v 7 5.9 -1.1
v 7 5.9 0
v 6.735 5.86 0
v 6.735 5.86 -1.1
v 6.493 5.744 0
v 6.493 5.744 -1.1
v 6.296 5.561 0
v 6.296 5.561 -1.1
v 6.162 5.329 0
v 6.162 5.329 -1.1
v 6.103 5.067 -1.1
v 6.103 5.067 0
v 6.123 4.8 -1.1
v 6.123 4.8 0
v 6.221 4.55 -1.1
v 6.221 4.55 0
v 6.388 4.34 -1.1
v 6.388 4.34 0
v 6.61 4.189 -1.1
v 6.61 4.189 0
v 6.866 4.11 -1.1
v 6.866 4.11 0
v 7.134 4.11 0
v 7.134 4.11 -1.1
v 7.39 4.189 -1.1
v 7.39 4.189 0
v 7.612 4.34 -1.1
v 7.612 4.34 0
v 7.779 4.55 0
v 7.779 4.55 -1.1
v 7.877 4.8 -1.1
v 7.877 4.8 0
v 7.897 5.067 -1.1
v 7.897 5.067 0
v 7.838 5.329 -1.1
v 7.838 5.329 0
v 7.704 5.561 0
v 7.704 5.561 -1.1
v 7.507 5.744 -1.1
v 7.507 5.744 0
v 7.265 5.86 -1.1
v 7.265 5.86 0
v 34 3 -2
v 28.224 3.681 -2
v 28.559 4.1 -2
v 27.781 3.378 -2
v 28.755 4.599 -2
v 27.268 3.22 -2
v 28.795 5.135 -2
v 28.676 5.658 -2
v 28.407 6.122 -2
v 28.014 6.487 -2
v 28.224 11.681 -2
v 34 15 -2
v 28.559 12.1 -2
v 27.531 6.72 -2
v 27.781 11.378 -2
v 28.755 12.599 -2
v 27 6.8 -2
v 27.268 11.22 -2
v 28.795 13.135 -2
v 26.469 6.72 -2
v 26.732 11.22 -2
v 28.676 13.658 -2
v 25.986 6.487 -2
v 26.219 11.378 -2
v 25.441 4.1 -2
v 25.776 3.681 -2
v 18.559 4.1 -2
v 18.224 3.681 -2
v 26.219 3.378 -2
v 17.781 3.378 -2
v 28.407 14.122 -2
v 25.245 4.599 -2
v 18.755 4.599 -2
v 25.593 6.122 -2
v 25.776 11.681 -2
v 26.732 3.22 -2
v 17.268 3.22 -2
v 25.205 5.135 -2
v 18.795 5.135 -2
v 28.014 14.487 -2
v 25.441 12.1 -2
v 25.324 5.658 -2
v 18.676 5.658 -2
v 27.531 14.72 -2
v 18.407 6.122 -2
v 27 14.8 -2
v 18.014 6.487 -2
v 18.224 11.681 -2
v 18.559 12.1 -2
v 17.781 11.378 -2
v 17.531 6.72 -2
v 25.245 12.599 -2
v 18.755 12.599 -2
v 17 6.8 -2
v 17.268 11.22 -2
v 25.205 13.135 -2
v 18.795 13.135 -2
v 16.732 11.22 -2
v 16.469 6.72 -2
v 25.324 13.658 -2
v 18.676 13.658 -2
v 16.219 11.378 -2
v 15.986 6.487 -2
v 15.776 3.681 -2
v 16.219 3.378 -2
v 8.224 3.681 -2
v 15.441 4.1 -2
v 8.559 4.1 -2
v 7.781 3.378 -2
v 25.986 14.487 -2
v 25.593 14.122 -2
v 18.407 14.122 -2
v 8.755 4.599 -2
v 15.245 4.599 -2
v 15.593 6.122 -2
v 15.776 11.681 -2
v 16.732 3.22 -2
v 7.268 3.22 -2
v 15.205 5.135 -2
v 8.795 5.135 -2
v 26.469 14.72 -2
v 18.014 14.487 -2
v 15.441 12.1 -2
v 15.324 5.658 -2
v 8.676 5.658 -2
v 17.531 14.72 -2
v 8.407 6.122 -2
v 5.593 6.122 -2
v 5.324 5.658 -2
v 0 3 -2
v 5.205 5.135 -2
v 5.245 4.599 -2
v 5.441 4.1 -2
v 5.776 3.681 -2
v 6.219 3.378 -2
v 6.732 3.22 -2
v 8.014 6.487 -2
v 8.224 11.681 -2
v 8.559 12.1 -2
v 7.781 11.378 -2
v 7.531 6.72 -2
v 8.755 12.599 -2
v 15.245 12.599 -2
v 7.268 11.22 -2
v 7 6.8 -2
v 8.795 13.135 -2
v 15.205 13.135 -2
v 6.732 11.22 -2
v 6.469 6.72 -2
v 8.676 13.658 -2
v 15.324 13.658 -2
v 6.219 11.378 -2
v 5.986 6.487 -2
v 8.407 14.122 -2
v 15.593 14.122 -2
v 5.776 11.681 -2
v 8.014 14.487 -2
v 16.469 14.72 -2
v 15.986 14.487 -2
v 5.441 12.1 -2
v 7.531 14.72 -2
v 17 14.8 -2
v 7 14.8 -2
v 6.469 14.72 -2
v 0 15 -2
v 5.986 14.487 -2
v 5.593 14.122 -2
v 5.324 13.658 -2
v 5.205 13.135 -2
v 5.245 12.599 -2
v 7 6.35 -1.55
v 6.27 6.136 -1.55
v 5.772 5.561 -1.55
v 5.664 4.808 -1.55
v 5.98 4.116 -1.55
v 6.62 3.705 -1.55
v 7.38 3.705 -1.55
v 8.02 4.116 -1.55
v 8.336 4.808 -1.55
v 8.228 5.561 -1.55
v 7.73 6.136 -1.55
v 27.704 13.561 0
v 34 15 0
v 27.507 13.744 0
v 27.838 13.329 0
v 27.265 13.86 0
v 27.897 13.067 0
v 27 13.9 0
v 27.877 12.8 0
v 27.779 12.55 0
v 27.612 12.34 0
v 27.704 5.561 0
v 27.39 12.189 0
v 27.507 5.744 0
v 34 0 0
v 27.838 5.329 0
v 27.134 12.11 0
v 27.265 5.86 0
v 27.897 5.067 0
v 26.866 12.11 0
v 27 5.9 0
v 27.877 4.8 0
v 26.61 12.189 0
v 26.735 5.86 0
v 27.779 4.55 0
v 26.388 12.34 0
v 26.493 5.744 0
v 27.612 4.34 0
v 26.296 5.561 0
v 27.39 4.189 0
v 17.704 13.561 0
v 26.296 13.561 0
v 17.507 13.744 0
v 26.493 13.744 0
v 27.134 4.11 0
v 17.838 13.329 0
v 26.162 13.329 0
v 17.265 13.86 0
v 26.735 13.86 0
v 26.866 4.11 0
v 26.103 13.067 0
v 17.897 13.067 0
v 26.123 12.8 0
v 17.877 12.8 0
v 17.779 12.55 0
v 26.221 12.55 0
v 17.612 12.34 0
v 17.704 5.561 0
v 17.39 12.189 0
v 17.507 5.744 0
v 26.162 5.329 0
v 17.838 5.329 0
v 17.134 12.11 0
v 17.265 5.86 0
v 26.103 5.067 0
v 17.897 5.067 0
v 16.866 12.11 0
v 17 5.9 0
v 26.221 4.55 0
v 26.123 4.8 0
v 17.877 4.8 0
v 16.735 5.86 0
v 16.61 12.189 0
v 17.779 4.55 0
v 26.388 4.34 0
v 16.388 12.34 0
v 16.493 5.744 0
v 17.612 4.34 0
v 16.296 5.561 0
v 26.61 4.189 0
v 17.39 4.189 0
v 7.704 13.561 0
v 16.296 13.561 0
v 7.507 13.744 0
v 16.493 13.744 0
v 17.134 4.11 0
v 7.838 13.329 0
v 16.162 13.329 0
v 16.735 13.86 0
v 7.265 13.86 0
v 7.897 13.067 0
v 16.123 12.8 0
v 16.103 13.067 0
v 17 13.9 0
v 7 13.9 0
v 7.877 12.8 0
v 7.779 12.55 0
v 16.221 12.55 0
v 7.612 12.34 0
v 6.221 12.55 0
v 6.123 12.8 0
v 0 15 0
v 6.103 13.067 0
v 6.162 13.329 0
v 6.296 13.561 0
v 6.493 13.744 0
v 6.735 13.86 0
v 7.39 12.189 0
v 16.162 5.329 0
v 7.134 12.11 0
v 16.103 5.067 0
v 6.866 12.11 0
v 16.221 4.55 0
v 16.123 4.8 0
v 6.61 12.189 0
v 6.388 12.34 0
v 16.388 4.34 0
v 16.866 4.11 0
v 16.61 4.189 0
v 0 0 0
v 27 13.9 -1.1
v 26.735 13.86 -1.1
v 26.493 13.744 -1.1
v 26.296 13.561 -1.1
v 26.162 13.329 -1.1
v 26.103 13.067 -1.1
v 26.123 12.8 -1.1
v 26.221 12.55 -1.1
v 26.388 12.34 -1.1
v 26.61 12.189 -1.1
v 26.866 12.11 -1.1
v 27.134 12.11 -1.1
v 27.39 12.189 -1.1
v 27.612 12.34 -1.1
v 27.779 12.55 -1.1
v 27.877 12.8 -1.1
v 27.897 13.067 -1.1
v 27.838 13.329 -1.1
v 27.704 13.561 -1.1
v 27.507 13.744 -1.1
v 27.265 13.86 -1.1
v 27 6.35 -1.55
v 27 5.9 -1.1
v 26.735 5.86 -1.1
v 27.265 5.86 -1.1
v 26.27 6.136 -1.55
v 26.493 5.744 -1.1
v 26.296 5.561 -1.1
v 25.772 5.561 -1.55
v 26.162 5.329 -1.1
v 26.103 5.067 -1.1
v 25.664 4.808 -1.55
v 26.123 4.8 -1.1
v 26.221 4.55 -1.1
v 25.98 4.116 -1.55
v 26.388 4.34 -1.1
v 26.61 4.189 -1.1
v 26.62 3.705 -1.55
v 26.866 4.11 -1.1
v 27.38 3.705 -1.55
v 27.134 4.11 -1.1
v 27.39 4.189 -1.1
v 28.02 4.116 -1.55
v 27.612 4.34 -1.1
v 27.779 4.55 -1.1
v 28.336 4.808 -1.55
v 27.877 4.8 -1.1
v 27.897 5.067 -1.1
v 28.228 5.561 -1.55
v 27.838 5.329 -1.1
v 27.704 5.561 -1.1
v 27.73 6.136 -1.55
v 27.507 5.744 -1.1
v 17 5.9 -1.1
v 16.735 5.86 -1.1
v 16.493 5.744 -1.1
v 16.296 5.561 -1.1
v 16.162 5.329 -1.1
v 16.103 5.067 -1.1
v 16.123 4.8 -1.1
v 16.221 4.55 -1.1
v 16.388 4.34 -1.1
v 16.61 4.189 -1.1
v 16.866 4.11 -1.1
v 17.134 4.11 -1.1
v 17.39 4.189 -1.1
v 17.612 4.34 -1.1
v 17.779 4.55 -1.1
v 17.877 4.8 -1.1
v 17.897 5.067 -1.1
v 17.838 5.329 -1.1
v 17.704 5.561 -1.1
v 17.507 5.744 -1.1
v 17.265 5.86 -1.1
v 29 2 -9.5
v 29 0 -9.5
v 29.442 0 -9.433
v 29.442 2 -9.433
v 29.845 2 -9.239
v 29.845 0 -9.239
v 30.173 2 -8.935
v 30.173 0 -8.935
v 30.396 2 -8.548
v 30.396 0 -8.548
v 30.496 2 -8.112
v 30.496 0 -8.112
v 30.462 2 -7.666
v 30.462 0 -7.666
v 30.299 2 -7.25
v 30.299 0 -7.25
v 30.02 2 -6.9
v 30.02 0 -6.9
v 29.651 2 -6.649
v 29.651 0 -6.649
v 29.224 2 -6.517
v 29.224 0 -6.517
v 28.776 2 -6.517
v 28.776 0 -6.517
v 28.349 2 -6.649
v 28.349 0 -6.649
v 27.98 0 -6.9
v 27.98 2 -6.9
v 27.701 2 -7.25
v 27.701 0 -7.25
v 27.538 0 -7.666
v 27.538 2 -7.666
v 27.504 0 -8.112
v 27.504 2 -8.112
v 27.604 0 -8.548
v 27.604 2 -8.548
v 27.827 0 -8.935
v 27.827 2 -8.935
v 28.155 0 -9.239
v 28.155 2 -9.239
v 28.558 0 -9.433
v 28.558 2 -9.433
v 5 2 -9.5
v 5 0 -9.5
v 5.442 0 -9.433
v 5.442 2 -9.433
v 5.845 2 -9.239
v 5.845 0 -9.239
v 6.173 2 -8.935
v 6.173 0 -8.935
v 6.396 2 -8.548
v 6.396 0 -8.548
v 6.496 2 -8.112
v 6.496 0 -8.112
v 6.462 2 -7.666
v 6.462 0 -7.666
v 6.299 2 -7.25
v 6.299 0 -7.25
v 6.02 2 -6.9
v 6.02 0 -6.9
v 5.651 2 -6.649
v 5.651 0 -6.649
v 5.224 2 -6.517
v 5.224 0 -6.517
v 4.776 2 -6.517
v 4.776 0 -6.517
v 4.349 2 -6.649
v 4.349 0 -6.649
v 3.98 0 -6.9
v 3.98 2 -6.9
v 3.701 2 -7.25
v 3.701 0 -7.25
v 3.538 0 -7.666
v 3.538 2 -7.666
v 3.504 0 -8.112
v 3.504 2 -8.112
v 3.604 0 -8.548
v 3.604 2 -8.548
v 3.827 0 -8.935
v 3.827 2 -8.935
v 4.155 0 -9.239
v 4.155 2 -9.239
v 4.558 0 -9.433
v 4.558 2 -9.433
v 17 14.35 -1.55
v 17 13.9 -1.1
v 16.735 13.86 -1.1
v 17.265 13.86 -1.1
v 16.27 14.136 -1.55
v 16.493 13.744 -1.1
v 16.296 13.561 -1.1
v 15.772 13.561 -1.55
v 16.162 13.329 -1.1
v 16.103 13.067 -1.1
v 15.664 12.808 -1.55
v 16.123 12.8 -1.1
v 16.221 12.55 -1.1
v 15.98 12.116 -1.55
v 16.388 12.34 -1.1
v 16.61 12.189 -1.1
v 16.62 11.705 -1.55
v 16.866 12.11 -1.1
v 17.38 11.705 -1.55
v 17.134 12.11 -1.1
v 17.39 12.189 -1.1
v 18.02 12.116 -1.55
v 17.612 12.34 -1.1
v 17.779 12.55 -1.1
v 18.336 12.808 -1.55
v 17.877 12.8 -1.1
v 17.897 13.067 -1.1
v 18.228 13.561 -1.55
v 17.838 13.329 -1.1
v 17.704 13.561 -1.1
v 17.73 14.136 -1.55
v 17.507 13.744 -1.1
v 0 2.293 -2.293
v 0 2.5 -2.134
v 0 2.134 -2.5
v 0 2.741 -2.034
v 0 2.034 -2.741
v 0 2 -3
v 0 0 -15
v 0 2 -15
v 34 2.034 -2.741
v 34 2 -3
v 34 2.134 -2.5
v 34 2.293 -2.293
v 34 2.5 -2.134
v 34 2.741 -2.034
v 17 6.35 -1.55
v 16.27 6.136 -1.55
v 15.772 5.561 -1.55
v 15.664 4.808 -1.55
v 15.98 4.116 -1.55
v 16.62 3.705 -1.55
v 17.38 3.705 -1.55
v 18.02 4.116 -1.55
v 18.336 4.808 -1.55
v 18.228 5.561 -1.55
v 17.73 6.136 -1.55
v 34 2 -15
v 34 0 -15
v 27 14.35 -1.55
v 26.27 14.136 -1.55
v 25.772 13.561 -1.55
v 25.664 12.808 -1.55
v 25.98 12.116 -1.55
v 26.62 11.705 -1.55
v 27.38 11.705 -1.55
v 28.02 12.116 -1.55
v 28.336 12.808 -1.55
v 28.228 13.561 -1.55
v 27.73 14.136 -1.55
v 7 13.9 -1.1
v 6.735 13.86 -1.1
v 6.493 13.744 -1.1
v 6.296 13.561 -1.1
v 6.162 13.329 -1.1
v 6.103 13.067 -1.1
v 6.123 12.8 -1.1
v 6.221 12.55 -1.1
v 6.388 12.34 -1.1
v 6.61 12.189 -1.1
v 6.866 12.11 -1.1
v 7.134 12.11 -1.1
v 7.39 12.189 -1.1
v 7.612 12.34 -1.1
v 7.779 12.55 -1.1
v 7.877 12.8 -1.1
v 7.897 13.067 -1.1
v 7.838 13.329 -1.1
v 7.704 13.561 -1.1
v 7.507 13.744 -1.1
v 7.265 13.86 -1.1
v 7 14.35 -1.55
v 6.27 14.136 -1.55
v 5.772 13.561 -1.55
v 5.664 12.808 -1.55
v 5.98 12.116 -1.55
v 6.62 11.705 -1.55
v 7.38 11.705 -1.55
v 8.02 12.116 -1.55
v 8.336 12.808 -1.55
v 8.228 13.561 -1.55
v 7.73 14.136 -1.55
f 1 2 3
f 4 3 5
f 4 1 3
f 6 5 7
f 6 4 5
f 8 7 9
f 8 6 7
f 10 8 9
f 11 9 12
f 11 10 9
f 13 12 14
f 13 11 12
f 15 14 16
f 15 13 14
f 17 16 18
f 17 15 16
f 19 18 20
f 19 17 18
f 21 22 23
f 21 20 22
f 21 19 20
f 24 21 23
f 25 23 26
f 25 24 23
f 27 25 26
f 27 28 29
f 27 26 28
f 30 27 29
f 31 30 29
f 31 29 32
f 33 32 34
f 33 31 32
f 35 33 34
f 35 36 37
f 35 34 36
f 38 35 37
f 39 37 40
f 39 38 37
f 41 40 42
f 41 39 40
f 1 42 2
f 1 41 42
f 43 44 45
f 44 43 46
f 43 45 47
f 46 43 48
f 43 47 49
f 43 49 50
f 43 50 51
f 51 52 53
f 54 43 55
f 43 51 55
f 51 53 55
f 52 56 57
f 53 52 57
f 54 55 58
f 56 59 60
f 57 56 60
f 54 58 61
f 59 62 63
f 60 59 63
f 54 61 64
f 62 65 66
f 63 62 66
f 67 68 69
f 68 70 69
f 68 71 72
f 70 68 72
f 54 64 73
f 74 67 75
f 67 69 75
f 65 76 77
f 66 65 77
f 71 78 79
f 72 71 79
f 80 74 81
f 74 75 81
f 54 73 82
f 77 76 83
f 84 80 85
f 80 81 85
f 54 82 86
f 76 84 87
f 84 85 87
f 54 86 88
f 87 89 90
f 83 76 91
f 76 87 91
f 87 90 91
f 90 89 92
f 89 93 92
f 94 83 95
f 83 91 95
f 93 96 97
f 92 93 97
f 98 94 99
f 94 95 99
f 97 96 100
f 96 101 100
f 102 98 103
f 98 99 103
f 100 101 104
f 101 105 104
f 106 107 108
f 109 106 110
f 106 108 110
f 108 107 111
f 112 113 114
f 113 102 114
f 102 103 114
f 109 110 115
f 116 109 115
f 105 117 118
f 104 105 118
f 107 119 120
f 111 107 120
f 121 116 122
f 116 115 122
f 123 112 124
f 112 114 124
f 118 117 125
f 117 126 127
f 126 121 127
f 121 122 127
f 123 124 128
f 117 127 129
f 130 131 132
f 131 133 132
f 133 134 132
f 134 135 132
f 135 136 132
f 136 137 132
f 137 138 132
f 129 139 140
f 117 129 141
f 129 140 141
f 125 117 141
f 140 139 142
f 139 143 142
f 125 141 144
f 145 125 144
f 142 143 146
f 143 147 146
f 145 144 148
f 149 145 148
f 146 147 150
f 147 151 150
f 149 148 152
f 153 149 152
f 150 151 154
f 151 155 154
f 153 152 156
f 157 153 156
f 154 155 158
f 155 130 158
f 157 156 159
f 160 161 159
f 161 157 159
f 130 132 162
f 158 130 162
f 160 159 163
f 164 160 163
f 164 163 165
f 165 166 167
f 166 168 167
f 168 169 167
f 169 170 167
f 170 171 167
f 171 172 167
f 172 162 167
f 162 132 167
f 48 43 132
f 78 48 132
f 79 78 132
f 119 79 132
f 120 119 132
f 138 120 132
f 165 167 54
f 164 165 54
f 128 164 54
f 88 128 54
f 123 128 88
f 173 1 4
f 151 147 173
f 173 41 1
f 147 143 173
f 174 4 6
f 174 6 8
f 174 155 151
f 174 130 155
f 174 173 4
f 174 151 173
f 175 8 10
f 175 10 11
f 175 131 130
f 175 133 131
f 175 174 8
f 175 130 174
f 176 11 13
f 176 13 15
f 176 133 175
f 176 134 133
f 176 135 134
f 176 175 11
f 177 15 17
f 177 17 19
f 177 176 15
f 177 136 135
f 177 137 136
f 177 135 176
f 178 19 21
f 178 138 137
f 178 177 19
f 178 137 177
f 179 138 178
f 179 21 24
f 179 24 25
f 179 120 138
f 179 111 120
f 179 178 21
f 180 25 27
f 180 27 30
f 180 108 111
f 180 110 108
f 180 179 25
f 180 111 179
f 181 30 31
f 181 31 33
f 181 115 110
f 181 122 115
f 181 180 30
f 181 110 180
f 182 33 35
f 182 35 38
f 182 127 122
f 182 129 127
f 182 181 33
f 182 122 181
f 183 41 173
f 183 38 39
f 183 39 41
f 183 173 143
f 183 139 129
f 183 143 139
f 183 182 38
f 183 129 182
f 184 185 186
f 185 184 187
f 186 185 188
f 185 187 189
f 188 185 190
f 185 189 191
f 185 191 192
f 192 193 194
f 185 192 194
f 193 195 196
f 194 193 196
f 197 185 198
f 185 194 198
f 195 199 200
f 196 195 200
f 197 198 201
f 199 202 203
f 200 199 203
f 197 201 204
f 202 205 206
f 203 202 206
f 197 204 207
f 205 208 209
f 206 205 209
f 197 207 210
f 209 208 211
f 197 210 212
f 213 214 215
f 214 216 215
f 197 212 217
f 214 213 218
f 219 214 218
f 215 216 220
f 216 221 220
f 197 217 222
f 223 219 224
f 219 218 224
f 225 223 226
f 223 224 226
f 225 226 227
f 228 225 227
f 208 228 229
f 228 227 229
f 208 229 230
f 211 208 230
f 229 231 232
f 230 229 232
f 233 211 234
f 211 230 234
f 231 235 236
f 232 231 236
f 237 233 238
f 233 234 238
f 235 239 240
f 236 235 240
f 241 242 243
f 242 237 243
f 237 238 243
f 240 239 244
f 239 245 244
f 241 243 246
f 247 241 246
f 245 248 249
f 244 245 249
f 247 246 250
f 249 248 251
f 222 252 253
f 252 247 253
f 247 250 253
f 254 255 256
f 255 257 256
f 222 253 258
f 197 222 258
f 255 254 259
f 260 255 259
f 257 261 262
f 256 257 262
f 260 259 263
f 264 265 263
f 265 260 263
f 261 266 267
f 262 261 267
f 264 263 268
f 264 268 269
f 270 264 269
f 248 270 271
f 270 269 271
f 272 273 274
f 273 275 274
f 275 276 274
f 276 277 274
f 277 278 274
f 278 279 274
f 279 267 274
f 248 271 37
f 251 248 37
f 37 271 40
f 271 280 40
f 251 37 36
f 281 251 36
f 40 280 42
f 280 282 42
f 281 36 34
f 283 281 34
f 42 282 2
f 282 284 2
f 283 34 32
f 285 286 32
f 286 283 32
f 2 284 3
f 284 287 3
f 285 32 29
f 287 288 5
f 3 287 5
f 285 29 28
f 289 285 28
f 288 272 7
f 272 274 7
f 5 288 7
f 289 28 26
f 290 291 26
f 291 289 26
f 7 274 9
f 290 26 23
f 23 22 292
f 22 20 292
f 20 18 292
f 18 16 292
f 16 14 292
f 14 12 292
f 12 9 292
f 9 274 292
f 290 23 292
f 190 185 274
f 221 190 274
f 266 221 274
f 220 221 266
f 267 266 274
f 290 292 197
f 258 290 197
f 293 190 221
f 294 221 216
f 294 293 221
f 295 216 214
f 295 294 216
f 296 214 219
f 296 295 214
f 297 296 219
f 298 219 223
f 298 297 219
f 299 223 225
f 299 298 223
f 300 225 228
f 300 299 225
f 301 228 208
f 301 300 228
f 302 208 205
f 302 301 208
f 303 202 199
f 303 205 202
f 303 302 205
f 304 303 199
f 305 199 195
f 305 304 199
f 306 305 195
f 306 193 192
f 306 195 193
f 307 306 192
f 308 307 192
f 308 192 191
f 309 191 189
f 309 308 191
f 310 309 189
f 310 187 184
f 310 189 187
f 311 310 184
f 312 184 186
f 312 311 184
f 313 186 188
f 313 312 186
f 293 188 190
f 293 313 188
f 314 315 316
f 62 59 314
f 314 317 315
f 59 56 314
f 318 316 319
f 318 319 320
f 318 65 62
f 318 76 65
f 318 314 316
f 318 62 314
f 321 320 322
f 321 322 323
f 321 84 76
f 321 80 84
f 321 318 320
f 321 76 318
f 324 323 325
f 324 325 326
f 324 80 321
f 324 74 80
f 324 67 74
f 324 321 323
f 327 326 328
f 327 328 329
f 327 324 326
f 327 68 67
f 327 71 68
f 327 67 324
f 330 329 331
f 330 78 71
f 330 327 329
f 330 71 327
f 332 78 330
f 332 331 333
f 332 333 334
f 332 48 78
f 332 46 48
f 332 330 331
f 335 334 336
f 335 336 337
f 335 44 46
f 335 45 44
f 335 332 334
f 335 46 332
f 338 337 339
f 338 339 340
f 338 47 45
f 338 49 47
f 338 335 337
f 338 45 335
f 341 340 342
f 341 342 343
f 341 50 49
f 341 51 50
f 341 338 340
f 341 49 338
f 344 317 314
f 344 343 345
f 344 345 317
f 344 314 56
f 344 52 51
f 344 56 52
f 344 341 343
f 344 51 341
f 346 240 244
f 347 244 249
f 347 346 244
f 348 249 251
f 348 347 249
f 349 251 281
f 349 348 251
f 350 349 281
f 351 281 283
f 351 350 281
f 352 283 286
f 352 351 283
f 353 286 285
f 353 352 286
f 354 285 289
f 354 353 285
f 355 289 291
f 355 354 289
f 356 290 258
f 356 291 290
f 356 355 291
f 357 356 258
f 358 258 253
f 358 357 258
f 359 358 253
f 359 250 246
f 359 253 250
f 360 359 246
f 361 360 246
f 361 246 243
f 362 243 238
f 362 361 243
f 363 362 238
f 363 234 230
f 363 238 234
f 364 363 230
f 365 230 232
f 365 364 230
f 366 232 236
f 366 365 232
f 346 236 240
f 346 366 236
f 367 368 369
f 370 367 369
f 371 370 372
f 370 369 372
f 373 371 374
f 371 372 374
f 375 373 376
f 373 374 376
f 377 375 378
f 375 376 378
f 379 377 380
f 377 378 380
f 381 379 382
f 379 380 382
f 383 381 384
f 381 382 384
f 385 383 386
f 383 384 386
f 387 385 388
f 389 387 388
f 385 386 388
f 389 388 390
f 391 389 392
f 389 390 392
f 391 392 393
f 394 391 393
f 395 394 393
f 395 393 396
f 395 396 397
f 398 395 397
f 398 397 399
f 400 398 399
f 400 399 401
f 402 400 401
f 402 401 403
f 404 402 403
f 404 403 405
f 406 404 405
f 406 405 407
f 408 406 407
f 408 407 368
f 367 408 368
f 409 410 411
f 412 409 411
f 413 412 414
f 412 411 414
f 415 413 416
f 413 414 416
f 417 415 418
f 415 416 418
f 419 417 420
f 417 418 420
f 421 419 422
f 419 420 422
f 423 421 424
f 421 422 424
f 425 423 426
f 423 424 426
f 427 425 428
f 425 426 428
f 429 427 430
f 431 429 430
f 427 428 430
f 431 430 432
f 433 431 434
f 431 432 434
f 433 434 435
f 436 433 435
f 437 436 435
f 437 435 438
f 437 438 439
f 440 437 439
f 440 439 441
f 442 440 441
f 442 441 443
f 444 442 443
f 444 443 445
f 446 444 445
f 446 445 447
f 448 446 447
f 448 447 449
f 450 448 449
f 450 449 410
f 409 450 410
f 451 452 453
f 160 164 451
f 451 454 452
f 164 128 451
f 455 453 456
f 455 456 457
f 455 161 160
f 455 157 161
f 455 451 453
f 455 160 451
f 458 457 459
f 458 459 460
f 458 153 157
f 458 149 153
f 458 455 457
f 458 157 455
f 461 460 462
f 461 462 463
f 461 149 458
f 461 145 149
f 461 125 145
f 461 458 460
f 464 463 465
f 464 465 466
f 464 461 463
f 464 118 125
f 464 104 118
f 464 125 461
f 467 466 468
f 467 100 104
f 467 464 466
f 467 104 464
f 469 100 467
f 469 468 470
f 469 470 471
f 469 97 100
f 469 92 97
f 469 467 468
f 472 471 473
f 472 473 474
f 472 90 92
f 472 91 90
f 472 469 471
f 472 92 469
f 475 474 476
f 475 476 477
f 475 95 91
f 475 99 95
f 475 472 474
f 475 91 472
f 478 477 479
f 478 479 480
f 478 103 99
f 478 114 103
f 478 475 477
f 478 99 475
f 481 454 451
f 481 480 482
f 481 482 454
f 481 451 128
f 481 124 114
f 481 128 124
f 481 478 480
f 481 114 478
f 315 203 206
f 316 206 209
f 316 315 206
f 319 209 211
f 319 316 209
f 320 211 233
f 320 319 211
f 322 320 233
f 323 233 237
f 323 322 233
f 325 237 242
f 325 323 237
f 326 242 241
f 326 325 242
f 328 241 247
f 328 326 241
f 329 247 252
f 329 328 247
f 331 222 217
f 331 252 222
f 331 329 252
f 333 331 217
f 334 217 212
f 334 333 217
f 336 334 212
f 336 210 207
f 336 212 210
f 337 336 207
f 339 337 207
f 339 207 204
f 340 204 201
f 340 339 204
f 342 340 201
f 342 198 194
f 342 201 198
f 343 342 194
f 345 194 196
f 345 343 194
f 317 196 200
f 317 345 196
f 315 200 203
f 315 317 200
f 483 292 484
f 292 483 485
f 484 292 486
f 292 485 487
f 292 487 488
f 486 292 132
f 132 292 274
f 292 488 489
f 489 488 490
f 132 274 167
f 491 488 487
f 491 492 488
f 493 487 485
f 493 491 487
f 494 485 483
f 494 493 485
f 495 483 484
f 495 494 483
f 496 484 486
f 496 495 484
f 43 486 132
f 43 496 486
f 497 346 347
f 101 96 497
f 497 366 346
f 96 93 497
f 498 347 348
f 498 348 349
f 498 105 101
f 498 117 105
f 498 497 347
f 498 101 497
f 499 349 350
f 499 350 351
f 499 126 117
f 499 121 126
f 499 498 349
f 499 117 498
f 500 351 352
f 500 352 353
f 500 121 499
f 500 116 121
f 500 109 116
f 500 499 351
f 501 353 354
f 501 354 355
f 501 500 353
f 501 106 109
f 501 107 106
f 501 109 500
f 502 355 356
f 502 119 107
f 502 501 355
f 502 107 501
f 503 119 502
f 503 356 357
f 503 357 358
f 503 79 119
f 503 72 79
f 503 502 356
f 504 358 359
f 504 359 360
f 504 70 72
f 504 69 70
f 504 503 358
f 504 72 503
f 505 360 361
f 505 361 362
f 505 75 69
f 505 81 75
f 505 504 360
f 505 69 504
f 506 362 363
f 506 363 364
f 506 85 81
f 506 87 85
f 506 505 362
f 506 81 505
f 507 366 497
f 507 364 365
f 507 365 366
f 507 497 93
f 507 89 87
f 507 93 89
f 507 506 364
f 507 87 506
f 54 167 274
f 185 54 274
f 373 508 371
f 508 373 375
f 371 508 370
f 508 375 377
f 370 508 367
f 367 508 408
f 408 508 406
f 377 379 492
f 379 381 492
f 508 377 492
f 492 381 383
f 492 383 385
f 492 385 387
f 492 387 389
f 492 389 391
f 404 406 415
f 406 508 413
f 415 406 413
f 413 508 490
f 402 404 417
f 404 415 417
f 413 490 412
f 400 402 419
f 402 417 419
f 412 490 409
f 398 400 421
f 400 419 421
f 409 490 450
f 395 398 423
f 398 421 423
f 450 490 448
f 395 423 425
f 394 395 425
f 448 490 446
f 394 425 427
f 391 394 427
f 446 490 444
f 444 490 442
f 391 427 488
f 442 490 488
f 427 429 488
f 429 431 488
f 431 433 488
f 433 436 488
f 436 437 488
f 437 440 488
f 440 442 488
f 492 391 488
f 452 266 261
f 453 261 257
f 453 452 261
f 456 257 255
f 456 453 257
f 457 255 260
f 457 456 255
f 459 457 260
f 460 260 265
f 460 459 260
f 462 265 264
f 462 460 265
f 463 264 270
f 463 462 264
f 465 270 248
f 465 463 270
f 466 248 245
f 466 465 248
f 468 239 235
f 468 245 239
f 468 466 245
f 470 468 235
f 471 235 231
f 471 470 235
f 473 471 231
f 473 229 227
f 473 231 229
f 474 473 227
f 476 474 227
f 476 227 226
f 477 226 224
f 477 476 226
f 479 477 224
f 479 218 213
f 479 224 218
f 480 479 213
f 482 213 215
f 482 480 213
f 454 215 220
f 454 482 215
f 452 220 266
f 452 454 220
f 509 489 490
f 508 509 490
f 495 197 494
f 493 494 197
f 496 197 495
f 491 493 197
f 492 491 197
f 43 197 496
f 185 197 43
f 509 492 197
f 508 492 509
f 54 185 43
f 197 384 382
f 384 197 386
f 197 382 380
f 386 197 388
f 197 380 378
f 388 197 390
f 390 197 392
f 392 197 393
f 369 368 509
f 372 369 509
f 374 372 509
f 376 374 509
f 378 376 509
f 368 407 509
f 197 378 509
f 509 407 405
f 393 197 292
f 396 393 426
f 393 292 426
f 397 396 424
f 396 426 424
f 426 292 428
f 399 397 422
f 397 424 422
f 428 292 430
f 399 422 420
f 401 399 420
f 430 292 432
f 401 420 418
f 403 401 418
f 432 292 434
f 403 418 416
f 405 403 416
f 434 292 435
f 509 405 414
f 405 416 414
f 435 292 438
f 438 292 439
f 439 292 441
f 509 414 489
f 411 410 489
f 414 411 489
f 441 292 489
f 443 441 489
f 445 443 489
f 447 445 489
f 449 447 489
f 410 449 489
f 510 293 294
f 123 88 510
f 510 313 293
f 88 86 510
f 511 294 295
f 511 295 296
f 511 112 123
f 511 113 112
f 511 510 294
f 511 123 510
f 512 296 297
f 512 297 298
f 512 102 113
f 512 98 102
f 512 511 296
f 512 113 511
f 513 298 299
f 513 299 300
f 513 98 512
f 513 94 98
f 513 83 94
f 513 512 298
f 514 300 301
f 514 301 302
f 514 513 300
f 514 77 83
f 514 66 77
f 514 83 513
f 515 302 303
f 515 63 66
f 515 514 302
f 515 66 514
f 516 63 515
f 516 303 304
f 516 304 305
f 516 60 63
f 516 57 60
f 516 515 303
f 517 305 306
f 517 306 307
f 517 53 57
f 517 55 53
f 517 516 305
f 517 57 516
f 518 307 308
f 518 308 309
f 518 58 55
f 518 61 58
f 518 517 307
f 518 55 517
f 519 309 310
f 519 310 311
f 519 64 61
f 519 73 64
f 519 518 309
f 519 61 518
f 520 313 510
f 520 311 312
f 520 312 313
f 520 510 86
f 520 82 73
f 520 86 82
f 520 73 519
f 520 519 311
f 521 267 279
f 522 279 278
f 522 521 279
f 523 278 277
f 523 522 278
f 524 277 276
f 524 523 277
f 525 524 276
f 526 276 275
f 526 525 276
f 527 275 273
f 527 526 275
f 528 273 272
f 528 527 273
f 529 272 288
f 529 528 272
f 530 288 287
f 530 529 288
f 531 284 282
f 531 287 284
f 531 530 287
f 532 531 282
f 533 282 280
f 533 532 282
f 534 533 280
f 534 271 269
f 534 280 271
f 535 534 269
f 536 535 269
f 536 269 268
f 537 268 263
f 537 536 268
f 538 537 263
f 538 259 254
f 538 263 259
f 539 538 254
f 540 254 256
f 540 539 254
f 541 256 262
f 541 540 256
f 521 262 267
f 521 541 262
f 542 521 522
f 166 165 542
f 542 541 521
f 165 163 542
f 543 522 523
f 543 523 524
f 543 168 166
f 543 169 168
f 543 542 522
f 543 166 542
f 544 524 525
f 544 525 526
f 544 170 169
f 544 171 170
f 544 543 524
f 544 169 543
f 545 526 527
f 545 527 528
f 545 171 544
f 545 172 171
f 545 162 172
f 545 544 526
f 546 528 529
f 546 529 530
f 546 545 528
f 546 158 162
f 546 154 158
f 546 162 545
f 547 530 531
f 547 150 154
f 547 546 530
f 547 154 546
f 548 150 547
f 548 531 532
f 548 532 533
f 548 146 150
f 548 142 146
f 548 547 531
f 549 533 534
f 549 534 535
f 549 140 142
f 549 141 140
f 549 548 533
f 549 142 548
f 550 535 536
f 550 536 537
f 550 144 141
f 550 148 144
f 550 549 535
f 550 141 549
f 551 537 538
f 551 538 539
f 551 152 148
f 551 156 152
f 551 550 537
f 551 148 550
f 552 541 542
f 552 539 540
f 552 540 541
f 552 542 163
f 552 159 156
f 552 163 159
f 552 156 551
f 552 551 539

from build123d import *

# Parameters (mm, degrees)
BOSS_EXTRUDE1_DEPTH                          = 34
FILLET1_R                                    = 1
SKETCH2_R                                    = 1.5
CUT_EXTRUDE3_DEPTH                           = 10
CSK_FOR_M1_6_COUNTERSUNK_FLAT_HEAD_S_2_COUNT = 2
CSK_FOR_M1_6_COUNTERSUNK_FLAT_HEAD_S_2_PITCH = 8
LPATTERN1_COUNT                              = 2
LPATTERN1_PITCH                              = 10
LPATTERN2_COUNT                              = 2
LPATTERN2_PITCH                              = 10


with BuildPart() as part:
    # Sketch1 → Boss-Extrude1 (new body)
    with BuildSketch(Plane(origin=(0, 0, 0), x_dir=(0, 0, -1), z_dir=(1, 0, 0))):
        Polygon((0, 15), (0, 0), (15, 0), (15, 2), (2, 2), (2, 15), align=None)
    extrude(amount=BOSS_EXTRUDE1_DEPTH)

    # Fillet1
    fillet1_edges = [part.edges().sort_by_distance(p)[0] for p in [
        (17, 2, -2),
    ]]
    fillet(fillet1_edges, radius=FILLET1_R)

    # Sketch2 → Cut-Extrude3 (cut)
    with BuildSketch(Plane.XZ):
        with Locations(Location((28.999999992, -7.999999993, 0), (0, 0, 270))):
            Circle(SKETCH2_R)
        with Locations(Location((5, -8, 0), (0, 0, 270))):
            Circle(SKETCH2_R)
    extrude(amount=-CUT_EXTRUDE3_DEPTH, mode=Mode.SUBTRACT)

    # Sketch4 → CSK for M1.6 Countersunk Flat Head Screw1 (revolve, cut)
    with BuildSketch(Plane(origin=(17, 5, -2), x_dir=(0, 1, 0), z_dir=(1, 0, 0))):
        Polygon((0, 0), (0, 30.540774557), (0.9, 30), (0.9, 0.9), (1.8, 0), align=None)
    csk_for_m1_6_countersunk_flat_head_screw = revolve(axis=Axis((17, 5, -8.35), (0, 0, 1)), mode=Mode.SUBTRACT)

    # CSK for M1.6 Countersunk Flat Head S 2: CSK for M1.6 Countersunk Flat Head Screw1 ×2
    with Locations(*[(0, i * CSK_FOR_M1_6_COUNTERSUNK_FLAT_HEAD_S_2_PITCH, 0) for i in range(1, CSK_FOR_M1_6_COUNTERSUNK_FLAT_HEAD_S_2_COUNT)]):
        add(csk_for_m1_6_countersunk_flat_head_screw, mode=Mode.SUBTRACT)

    # LPattern1: CSK for M1.6 Countersunk Flat Head Screw1 ×2
    with Locations(*[(-i * LPATTERN1_PITCH, 0, 0) for i in range(1, LPATTERN1_COUNT)]):
        add(csk_for_m1_6_countersunk_flat_head_screw, mode=Mode.SUBTRACT)

    # LPattern1 copy 1 sketch → LPattern1 copy 1 (revolve, cut)
    with BuildSketch(Plane(origin=(7, 13, -2), x_dir=(0, 1, 0), z_dir=(1, 0, 0))):
        Polygon((0, 0), (0, 30.540774557), (0.9, 30), (0.9, 0.9), (1.8, 0), align=None)
    revolve(axis=Axis((7, 13, -8.35), (0, 0, 1)), mode=Mode.SUBTRACT)

    # LPattern2: CSK for M1.6 Countersunk Flat Head Screw1 ×2
    with Locations(*[(i * LPATTERN2_PITCH, 0, 0) for i in range(1, LPATTERN2_COUNT)]):
        add(csk_for_m1_6_countersunk_flat_head_screw, mode=Mode.SUBTRACT)

    # LPattern2 copy 1 sketch → LPattern2 copy 1 (revolve, cut)
    with BuildSketch(Plane(origin=(27, 13, -2), x_dir=(0, 1, 0), z_dir=(1, 0, 0))):
        Polygon((0, 0), (0, 30.540774557), (0.9, 30), (0.9, 0.9), (1.8, 0), align=None)
    revolve(axis=Axis((27, 13, -8.35), (0, 0, 1)), mode=Mode.SUBTRACT)


solid = part.part
